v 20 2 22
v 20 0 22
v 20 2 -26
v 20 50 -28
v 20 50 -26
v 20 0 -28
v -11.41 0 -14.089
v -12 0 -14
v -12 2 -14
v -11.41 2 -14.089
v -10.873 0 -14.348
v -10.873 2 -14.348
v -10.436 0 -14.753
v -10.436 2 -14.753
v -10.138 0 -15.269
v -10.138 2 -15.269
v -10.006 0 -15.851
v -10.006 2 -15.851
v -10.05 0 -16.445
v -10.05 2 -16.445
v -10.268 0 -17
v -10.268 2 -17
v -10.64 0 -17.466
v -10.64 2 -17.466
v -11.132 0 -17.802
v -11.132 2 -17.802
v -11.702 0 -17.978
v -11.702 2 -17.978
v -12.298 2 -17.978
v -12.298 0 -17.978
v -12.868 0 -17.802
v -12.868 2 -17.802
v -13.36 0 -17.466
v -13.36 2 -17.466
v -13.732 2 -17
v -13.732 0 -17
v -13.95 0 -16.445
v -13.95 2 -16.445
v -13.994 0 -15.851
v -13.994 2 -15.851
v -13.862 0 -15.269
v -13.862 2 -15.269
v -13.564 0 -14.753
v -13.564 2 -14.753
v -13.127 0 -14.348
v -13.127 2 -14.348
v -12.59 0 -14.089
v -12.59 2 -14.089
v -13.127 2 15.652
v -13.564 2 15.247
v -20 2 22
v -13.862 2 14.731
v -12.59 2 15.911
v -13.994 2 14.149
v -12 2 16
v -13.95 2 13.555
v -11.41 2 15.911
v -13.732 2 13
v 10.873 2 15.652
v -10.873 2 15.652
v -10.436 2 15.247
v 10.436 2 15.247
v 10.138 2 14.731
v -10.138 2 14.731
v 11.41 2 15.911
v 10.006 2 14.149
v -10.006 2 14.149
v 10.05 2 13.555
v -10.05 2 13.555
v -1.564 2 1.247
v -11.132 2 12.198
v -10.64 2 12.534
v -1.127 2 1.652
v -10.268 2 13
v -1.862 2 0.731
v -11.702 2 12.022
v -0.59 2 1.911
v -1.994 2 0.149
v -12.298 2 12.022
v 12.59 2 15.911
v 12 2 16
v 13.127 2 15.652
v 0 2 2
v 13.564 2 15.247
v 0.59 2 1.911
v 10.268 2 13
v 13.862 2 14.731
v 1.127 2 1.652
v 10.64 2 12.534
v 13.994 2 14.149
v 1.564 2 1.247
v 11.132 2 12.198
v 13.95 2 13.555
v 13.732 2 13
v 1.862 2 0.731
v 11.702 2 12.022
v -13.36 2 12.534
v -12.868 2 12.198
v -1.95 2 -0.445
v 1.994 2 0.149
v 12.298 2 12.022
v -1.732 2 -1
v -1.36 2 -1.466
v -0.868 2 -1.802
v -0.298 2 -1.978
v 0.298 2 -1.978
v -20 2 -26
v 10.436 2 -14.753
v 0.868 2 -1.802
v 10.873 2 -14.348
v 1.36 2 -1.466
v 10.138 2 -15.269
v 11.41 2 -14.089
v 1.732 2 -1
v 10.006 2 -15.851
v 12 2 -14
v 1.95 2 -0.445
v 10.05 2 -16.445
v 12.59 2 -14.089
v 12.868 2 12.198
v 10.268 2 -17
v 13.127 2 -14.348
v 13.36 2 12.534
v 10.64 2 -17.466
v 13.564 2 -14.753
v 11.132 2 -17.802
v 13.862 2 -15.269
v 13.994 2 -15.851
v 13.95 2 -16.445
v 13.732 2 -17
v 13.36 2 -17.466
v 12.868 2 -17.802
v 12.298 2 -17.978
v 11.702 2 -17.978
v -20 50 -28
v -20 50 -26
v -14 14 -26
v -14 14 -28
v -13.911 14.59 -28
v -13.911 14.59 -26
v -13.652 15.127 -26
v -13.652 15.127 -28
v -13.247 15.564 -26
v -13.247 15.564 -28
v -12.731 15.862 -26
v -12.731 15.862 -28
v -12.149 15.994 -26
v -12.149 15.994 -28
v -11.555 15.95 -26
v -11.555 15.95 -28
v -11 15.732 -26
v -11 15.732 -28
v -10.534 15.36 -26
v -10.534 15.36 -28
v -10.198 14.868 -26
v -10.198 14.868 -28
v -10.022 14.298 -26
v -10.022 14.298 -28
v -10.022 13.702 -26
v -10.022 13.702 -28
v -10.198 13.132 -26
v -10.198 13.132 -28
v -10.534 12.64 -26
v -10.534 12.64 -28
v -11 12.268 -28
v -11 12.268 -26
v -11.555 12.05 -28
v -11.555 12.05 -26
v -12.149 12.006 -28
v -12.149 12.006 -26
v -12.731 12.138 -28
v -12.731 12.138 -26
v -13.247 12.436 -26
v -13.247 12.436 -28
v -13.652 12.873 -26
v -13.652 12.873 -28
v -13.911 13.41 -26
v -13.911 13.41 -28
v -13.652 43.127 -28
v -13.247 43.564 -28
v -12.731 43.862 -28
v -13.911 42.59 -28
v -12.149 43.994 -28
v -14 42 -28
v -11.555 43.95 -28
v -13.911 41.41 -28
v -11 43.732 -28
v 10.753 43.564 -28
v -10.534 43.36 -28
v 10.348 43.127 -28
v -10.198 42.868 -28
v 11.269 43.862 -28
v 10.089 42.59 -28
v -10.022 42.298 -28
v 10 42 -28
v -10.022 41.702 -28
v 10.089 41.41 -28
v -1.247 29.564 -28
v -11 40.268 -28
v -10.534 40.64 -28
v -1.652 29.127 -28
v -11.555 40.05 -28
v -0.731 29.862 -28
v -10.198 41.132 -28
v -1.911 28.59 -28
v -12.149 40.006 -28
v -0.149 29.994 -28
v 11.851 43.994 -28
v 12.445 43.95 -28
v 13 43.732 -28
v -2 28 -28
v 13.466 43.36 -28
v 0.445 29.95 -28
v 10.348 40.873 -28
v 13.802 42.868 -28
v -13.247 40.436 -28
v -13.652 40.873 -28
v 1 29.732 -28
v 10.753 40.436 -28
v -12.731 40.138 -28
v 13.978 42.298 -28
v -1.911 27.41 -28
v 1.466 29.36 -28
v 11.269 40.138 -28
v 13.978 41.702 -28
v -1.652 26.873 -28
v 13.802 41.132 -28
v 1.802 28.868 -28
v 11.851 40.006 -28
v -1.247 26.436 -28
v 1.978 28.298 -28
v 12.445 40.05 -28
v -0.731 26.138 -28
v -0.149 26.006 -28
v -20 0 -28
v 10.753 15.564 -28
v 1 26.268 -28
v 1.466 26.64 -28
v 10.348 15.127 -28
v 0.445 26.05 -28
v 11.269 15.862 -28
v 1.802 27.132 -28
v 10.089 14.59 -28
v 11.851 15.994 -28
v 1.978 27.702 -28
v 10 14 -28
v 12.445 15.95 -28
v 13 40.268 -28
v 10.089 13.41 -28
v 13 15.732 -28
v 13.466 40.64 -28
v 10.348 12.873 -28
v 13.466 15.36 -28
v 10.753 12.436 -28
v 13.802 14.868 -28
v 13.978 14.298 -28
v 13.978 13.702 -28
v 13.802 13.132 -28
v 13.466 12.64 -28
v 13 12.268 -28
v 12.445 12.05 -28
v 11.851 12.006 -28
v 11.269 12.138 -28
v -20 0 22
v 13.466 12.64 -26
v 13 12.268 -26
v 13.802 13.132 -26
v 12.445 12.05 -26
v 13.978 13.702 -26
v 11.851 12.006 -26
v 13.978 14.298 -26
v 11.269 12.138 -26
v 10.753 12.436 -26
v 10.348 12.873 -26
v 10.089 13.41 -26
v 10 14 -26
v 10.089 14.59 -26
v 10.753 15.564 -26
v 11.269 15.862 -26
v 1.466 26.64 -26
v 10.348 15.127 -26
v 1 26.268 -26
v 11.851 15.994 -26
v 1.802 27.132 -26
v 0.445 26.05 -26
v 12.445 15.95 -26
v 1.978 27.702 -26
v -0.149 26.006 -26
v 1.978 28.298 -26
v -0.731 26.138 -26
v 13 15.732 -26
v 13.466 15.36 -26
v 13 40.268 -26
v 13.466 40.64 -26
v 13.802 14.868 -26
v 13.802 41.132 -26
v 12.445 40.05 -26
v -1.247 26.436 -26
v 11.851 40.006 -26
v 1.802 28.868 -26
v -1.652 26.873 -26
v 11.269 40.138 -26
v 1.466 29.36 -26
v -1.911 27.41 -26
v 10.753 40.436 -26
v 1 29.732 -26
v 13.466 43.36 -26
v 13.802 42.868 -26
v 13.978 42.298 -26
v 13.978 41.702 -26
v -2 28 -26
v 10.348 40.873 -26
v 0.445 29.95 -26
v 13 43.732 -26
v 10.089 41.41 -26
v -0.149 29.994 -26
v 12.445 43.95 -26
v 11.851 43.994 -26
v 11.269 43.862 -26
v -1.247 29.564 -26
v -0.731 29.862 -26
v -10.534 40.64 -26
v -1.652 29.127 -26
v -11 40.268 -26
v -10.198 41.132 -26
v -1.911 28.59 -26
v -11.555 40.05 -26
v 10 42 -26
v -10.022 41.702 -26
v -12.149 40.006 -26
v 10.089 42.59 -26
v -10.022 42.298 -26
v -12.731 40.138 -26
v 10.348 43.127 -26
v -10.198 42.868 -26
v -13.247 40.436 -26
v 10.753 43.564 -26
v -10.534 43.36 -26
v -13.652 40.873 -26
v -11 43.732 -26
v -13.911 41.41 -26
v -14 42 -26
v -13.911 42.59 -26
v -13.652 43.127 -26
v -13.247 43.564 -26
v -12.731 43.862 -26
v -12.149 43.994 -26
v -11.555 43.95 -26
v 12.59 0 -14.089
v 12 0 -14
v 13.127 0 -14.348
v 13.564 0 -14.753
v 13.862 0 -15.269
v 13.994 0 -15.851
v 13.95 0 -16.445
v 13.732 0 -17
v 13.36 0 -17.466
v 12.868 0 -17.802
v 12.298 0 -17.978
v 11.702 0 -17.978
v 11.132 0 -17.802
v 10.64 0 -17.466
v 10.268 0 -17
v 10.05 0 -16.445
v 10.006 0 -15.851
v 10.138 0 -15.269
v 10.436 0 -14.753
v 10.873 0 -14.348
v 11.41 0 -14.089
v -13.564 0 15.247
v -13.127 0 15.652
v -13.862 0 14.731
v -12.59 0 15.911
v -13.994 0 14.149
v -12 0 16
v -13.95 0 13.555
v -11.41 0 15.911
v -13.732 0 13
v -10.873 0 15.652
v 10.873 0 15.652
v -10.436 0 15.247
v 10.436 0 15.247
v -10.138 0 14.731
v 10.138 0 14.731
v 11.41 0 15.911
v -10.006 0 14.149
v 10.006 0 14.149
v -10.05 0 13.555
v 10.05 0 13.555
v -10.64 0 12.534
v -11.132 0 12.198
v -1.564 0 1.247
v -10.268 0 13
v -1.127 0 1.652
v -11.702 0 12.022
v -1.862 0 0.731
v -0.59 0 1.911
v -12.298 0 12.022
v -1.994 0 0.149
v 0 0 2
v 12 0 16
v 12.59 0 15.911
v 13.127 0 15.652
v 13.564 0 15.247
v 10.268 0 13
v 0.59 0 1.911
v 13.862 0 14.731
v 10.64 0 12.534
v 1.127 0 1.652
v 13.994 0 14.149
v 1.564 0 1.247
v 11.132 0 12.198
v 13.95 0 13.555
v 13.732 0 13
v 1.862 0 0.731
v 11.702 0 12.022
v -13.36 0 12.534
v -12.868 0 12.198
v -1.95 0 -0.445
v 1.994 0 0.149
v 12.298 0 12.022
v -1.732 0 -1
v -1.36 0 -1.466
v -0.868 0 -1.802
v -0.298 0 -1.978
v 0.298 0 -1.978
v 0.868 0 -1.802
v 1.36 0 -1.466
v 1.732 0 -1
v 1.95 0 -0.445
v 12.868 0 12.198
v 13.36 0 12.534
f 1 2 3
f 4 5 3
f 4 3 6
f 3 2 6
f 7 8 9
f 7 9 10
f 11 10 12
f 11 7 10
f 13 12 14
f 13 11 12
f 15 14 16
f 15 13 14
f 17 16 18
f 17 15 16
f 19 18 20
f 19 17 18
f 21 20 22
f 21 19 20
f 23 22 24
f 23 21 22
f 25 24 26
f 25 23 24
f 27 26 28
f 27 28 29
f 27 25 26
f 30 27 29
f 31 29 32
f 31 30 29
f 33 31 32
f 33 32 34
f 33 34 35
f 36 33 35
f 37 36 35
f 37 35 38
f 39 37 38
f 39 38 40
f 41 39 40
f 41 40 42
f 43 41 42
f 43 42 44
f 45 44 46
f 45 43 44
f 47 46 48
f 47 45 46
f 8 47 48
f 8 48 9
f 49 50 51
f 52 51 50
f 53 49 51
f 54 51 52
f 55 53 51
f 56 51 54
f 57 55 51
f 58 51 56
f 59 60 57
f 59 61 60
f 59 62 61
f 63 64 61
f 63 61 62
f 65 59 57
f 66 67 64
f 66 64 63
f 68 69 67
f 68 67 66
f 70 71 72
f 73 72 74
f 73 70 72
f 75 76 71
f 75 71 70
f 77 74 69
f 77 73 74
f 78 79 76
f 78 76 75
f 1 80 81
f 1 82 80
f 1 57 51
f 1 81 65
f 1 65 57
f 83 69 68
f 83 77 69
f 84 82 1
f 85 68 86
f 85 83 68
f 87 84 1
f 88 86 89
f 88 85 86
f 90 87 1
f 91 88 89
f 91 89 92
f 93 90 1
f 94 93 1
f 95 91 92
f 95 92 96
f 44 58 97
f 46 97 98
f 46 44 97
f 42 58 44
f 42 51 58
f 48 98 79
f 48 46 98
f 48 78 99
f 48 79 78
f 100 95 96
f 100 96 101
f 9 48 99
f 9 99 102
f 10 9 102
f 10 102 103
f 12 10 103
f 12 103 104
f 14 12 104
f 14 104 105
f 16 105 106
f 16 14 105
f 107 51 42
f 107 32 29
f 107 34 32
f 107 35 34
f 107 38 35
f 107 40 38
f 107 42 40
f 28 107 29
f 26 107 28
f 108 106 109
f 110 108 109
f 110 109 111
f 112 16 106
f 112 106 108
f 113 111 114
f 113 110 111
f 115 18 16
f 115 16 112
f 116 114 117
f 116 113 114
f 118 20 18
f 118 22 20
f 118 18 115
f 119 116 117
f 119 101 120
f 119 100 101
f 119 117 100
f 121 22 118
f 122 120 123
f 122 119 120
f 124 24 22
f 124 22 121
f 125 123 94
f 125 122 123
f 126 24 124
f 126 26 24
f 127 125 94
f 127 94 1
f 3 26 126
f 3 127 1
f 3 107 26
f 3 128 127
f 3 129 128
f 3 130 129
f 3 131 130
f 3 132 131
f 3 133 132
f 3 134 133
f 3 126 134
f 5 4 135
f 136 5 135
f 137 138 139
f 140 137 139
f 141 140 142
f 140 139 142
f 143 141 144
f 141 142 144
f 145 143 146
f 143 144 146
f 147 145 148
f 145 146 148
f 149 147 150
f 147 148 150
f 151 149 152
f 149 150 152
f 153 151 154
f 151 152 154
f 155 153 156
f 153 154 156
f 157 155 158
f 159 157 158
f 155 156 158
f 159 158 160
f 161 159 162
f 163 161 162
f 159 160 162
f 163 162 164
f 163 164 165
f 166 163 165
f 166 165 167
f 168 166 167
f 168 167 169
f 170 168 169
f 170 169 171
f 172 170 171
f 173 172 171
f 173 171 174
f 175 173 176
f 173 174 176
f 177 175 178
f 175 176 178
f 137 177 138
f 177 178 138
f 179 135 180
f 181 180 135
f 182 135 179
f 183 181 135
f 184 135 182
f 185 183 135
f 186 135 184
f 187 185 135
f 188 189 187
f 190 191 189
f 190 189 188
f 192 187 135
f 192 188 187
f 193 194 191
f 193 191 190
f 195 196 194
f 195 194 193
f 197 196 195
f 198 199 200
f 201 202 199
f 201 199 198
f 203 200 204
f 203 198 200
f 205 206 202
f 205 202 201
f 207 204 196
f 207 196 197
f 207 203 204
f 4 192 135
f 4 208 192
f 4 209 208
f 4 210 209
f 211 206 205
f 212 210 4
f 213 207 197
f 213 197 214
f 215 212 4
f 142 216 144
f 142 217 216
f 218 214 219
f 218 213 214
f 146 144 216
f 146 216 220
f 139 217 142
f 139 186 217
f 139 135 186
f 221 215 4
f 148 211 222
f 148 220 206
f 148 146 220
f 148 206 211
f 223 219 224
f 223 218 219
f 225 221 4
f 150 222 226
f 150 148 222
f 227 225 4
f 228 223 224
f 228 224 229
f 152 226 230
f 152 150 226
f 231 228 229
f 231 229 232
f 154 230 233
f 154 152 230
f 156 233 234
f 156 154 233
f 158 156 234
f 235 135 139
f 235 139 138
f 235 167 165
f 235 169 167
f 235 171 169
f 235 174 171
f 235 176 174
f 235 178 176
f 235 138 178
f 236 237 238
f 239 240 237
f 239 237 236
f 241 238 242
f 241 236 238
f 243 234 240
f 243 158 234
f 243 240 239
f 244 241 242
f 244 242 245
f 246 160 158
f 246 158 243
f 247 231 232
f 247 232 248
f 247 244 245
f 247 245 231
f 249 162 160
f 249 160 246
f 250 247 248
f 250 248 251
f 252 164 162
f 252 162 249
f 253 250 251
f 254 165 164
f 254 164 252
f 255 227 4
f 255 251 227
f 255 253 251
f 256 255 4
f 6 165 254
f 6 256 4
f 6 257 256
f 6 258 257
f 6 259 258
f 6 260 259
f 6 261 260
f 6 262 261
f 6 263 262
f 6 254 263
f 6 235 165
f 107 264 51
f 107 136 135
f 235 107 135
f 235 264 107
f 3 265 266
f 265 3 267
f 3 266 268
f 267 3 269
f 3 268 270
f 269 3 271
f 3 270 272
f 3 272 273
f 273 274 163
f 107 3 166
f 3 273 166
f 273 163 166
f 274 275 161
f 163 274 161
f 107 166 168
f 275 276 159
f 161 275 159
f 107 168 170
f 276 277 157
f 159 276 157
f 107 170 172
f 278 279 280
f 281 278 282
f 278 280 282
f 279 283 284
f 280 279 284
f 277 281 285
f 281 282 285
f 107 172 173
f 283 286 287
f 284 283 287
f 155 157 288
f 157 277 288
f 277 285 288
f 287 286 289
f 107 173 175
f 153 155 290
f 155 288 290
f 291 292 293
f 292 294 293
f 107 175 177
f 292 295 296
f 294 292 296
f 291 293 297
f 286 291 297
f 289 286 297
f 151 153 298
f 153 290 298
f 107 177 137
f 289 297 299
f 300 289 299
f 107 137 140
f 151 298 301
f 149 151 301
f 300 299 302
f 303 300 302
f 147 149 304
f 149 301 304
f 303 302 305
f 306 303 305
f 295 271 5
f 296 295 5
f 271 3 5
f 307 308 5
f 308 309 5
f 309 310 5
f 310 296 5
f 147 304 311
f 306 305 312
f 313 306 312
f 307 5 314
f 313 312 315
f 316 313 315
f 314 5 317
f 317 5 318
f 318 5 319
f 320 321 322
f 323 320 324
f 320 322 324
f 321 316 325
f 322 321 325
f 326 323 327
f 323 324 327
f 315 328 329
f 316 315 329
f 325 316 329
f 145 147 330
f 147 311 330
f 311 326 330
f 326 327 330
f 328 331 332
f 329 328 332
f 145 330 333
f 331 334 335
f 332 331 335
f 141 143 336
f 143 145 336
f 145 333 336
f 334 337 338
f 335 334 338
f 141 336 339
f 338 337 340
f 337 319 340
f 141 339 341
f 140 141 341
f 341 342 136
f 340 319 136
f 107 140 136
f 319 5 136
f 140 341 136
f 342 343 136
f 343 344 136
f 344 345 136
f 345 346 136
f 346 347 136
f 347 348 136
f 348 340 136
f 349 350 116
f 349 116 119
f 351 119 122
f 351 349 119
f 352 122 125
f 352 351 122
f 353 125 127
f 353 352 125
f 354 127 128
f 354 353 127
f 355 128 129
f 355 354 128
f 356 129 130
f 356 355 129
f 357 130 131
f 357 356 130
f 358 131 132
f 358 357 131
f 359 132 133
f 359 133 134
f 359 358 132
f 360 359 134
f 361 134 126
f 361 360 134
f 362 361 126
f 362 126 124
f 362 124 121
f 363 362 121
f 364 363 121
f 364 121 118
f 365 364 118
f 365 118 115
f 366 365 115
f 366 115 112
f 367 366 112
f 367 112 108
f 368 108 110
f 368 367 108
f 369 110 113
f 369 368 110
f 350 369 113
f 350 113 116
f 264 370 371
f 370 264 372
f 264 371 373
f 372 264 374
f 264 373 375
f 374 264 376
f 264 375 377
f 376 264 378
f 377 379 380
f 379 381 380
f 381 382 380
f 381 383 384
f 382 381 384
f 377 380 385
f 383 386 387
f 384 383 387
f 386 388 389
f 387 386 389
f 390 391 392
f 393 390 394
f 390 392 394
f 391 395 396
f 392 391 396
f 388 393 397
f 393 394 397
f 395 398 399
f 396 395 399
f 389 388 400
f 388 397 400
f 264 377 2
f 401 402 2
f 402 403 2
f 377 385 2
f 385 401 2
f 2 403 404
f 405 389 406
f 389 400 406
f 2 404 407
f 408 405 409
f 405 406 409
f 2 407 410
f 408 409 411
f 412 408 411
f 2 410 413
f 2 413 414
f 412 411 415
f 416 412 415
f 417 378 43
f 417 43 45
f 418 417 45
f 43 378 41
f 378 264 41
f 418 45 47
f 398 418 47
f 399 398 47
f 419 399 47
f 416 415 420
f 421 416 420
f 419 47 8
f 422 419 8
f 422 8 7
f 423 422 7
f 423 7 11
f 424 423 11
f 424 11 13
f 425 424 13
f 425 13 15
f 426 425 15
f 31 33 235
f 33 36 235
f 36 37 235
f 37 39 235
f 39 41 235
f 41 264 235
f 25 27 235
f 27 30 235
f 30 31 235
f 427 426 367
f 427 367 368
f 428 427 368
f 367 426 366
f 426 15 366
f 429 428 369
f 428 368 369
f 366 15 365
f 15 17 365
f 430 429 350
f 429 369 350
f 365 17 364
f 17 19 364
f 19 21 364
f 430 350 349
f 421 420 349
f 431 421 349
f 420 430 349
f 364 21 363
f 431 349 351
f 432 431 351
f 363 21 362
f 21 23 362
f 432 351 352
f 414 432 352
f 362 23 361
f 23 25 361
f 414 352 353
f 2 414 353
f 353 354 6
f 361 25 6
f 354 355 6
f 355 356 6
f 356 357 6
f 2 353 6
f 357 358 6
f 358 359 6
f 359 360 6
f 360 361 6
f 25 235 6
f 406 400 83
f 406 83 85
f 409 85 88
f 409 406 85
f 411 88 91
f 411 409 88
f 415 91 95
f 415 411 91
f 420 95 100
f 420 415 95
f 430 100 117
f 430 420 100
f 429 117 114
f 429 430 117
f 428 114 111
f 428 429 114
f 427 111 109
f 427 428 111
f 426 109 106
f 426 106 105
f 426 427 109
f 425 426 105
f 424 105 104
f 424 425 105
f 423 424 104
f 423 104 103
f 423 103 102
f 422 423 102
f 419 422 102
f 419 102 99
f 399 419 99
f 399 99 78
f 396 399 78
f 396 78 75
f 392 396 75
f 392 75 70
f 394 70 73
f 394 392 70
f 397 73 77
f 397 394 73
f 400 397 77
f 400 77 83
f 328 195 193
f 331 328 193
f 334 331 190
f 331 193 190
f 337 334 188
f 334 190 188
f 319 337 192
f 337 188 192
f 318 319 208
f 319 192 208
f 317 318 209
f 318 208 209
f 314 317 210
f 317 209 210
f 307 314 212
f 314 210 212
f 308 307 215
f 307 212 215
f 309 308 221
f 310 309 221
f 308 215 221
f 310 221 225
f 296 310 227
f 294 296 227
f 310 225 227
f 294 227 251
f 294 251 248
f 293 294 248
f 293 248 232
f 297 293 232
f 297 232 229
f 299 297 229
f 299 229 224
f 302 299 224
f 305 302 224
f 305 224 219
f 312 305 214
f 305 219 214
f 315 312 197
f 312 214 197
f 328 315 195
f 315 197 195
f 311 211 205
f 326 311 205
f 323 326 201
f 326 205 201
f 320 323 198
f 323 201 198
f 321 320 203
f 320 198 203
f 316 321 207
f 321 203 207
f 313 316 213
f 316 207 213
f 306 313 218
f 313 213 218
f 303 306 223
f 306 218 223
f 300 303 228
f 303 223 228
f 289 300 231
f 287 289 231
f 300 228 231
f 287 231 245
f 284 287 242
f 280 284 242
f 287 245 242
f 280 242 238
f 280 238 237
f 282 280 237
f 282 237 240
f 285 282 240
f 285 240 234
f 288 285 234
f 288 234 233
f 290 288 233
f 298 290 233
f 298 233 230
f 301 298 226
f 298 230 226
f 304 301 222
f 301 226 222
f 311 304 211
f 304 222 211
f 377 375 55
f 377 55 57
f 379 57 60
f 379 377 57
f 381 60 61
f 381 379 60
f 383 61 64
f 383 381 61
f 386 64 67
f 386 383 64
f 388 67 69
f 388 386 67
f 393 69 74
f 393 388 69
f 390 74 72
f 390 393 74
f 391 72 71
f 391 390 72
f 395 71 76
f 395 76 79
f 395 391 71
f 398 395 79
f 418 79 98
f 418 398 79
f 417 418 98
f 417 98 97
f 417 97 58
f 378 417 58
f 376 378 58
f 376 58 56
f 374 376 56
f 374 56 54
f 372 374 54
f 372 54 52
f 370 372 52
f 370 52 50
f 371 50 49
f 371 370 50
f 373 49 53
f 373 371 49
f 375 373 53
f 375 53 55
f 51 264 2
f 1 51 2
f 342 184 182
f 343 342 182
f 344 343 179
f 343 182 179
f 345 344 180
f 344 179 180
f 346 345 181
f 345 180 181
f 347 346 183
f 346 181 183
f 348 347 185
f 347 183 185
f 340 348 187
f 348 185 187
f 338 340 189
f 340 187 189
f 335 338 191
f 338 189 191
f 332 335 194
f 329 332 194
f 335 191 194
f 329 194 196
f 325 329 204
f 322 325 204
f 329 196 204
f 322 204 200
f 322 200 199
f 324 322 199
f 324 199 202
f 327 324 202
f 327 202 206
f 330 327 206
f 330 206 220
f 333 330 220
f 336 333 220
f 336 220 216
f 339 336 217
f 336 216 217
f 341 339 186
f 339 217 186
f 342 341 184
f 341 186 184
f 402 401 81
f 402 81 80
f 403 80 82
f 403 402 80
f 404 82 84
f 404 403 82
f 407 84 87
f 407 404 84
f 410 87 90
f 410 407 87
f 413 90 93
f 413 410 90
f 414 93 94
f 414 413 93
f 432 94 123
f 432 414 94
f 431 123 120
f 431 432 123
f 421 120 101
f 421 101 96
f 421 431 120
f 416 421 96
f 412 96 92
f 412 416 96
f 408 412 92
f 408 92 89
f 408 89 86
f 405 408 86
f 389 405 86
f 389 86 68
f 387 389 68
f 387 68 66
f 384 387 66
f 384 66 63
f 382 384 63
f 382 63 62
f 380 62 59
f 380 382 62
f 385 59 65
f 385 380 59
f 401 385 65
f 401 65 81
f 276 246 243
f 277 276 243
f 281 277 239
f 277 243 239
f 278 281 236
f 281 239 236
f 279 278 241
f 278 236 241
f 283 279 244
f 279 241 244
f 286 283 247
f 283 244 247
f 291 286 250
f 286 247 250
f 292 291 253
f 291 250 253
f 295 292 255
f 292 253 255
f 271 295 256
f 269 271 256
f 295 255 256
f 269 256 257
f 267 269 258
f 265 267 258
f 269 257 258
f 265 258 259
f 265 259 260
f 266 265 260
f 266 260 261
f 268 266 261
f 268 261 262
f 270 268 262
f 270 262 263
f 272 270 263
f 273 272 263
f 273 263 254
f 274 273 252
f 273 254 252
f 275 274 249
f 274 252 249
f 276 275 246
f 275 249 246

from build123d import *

# Parameters (mm, degrees)
ESQUISSE1_W        = 40
ESQUISSE1_H        = 50
ESQUISSE1_R        = 2
BOSS_EXTRU_1_DEPTH = 2
ESQUISSE4_W        = 40
ESQUISSE4_H        = 50
ESQUISSE4_R        = 2
BOSS_EXTRU_3_DEPTH = 2


with BuildPart() as part:
    # Esquisse1 → Boss.-Extru.1 (new body)
    with BuildSketch(Plane(origin=(0, 0, 0), x_dir=(1, 0, 0), z_dir=(0, 1, 0))):
        with Locations((0, 3)):
            Rectangle(ESQUISSE1_W, ESQUISSE1_H)
        with Locations(Location((0, 0, 0), (0, 0, 270))):
            Circle(ESQUISSE1_R, mode=Mode.SUBTRACT)
        with Locations(Location((-12, -14, 0), (0, 0, 270))):
            Circle(ESQUISSE1_R, mode=Mode.SUBTRACT)
        with Locations(Location((-12, 16, 0), (0, 0, 270))):
            Circle(ESQUISSE1_R, mode=Mode.SUBTRACT)
        with Locations(Location((12, 16, 0), (0, 0, 270))):
            Circle(ESQUISSE1_R, mode=Mode.SUBTRACT)
        with Locations(Location((12, -14, 0), (0, 0, 270))):
            Circle(ESQUISSE1_R, mode=Mode.SUBTRACT)
    extrude(amount=BOSS_EXTRU_1_DEPTH)

    # Esquisse4 → Boss.-Extru.3 (add)
    with BuildSketch(Plane(origin=(0, 0, -28), x_dir=(-1, 0, 0), z_dir=(0, 0, -1))):
        with Locations((0, 25)):
            Rectangle(ESQUISSE4_W, ESQUISSE4_H)
        with Locations((0, 28)):
            Circle(ESQUISSE4_R, mode=Mode.SUBTRACT)
        with Locations((12, 42)):
            Circle(ESQUISSE4_R, mode=Mode.SUBTRACT)
        with Locations((-12, 42)):
            Circle(ESQUISSE4_R, mode=Mode.SUBTRACT)
        with Locations((-12, 14)):
            Circle(ESQUISSE4_R, mode=Mode.SUBTRACT)
        with Locations((12, 14)):
            Circle(ESQUISSE4_R, mode=Mode.SUBTRACT)
    extrude(amount=-BOSS_EXTRU_3_DEPTH)


solid = part.part
